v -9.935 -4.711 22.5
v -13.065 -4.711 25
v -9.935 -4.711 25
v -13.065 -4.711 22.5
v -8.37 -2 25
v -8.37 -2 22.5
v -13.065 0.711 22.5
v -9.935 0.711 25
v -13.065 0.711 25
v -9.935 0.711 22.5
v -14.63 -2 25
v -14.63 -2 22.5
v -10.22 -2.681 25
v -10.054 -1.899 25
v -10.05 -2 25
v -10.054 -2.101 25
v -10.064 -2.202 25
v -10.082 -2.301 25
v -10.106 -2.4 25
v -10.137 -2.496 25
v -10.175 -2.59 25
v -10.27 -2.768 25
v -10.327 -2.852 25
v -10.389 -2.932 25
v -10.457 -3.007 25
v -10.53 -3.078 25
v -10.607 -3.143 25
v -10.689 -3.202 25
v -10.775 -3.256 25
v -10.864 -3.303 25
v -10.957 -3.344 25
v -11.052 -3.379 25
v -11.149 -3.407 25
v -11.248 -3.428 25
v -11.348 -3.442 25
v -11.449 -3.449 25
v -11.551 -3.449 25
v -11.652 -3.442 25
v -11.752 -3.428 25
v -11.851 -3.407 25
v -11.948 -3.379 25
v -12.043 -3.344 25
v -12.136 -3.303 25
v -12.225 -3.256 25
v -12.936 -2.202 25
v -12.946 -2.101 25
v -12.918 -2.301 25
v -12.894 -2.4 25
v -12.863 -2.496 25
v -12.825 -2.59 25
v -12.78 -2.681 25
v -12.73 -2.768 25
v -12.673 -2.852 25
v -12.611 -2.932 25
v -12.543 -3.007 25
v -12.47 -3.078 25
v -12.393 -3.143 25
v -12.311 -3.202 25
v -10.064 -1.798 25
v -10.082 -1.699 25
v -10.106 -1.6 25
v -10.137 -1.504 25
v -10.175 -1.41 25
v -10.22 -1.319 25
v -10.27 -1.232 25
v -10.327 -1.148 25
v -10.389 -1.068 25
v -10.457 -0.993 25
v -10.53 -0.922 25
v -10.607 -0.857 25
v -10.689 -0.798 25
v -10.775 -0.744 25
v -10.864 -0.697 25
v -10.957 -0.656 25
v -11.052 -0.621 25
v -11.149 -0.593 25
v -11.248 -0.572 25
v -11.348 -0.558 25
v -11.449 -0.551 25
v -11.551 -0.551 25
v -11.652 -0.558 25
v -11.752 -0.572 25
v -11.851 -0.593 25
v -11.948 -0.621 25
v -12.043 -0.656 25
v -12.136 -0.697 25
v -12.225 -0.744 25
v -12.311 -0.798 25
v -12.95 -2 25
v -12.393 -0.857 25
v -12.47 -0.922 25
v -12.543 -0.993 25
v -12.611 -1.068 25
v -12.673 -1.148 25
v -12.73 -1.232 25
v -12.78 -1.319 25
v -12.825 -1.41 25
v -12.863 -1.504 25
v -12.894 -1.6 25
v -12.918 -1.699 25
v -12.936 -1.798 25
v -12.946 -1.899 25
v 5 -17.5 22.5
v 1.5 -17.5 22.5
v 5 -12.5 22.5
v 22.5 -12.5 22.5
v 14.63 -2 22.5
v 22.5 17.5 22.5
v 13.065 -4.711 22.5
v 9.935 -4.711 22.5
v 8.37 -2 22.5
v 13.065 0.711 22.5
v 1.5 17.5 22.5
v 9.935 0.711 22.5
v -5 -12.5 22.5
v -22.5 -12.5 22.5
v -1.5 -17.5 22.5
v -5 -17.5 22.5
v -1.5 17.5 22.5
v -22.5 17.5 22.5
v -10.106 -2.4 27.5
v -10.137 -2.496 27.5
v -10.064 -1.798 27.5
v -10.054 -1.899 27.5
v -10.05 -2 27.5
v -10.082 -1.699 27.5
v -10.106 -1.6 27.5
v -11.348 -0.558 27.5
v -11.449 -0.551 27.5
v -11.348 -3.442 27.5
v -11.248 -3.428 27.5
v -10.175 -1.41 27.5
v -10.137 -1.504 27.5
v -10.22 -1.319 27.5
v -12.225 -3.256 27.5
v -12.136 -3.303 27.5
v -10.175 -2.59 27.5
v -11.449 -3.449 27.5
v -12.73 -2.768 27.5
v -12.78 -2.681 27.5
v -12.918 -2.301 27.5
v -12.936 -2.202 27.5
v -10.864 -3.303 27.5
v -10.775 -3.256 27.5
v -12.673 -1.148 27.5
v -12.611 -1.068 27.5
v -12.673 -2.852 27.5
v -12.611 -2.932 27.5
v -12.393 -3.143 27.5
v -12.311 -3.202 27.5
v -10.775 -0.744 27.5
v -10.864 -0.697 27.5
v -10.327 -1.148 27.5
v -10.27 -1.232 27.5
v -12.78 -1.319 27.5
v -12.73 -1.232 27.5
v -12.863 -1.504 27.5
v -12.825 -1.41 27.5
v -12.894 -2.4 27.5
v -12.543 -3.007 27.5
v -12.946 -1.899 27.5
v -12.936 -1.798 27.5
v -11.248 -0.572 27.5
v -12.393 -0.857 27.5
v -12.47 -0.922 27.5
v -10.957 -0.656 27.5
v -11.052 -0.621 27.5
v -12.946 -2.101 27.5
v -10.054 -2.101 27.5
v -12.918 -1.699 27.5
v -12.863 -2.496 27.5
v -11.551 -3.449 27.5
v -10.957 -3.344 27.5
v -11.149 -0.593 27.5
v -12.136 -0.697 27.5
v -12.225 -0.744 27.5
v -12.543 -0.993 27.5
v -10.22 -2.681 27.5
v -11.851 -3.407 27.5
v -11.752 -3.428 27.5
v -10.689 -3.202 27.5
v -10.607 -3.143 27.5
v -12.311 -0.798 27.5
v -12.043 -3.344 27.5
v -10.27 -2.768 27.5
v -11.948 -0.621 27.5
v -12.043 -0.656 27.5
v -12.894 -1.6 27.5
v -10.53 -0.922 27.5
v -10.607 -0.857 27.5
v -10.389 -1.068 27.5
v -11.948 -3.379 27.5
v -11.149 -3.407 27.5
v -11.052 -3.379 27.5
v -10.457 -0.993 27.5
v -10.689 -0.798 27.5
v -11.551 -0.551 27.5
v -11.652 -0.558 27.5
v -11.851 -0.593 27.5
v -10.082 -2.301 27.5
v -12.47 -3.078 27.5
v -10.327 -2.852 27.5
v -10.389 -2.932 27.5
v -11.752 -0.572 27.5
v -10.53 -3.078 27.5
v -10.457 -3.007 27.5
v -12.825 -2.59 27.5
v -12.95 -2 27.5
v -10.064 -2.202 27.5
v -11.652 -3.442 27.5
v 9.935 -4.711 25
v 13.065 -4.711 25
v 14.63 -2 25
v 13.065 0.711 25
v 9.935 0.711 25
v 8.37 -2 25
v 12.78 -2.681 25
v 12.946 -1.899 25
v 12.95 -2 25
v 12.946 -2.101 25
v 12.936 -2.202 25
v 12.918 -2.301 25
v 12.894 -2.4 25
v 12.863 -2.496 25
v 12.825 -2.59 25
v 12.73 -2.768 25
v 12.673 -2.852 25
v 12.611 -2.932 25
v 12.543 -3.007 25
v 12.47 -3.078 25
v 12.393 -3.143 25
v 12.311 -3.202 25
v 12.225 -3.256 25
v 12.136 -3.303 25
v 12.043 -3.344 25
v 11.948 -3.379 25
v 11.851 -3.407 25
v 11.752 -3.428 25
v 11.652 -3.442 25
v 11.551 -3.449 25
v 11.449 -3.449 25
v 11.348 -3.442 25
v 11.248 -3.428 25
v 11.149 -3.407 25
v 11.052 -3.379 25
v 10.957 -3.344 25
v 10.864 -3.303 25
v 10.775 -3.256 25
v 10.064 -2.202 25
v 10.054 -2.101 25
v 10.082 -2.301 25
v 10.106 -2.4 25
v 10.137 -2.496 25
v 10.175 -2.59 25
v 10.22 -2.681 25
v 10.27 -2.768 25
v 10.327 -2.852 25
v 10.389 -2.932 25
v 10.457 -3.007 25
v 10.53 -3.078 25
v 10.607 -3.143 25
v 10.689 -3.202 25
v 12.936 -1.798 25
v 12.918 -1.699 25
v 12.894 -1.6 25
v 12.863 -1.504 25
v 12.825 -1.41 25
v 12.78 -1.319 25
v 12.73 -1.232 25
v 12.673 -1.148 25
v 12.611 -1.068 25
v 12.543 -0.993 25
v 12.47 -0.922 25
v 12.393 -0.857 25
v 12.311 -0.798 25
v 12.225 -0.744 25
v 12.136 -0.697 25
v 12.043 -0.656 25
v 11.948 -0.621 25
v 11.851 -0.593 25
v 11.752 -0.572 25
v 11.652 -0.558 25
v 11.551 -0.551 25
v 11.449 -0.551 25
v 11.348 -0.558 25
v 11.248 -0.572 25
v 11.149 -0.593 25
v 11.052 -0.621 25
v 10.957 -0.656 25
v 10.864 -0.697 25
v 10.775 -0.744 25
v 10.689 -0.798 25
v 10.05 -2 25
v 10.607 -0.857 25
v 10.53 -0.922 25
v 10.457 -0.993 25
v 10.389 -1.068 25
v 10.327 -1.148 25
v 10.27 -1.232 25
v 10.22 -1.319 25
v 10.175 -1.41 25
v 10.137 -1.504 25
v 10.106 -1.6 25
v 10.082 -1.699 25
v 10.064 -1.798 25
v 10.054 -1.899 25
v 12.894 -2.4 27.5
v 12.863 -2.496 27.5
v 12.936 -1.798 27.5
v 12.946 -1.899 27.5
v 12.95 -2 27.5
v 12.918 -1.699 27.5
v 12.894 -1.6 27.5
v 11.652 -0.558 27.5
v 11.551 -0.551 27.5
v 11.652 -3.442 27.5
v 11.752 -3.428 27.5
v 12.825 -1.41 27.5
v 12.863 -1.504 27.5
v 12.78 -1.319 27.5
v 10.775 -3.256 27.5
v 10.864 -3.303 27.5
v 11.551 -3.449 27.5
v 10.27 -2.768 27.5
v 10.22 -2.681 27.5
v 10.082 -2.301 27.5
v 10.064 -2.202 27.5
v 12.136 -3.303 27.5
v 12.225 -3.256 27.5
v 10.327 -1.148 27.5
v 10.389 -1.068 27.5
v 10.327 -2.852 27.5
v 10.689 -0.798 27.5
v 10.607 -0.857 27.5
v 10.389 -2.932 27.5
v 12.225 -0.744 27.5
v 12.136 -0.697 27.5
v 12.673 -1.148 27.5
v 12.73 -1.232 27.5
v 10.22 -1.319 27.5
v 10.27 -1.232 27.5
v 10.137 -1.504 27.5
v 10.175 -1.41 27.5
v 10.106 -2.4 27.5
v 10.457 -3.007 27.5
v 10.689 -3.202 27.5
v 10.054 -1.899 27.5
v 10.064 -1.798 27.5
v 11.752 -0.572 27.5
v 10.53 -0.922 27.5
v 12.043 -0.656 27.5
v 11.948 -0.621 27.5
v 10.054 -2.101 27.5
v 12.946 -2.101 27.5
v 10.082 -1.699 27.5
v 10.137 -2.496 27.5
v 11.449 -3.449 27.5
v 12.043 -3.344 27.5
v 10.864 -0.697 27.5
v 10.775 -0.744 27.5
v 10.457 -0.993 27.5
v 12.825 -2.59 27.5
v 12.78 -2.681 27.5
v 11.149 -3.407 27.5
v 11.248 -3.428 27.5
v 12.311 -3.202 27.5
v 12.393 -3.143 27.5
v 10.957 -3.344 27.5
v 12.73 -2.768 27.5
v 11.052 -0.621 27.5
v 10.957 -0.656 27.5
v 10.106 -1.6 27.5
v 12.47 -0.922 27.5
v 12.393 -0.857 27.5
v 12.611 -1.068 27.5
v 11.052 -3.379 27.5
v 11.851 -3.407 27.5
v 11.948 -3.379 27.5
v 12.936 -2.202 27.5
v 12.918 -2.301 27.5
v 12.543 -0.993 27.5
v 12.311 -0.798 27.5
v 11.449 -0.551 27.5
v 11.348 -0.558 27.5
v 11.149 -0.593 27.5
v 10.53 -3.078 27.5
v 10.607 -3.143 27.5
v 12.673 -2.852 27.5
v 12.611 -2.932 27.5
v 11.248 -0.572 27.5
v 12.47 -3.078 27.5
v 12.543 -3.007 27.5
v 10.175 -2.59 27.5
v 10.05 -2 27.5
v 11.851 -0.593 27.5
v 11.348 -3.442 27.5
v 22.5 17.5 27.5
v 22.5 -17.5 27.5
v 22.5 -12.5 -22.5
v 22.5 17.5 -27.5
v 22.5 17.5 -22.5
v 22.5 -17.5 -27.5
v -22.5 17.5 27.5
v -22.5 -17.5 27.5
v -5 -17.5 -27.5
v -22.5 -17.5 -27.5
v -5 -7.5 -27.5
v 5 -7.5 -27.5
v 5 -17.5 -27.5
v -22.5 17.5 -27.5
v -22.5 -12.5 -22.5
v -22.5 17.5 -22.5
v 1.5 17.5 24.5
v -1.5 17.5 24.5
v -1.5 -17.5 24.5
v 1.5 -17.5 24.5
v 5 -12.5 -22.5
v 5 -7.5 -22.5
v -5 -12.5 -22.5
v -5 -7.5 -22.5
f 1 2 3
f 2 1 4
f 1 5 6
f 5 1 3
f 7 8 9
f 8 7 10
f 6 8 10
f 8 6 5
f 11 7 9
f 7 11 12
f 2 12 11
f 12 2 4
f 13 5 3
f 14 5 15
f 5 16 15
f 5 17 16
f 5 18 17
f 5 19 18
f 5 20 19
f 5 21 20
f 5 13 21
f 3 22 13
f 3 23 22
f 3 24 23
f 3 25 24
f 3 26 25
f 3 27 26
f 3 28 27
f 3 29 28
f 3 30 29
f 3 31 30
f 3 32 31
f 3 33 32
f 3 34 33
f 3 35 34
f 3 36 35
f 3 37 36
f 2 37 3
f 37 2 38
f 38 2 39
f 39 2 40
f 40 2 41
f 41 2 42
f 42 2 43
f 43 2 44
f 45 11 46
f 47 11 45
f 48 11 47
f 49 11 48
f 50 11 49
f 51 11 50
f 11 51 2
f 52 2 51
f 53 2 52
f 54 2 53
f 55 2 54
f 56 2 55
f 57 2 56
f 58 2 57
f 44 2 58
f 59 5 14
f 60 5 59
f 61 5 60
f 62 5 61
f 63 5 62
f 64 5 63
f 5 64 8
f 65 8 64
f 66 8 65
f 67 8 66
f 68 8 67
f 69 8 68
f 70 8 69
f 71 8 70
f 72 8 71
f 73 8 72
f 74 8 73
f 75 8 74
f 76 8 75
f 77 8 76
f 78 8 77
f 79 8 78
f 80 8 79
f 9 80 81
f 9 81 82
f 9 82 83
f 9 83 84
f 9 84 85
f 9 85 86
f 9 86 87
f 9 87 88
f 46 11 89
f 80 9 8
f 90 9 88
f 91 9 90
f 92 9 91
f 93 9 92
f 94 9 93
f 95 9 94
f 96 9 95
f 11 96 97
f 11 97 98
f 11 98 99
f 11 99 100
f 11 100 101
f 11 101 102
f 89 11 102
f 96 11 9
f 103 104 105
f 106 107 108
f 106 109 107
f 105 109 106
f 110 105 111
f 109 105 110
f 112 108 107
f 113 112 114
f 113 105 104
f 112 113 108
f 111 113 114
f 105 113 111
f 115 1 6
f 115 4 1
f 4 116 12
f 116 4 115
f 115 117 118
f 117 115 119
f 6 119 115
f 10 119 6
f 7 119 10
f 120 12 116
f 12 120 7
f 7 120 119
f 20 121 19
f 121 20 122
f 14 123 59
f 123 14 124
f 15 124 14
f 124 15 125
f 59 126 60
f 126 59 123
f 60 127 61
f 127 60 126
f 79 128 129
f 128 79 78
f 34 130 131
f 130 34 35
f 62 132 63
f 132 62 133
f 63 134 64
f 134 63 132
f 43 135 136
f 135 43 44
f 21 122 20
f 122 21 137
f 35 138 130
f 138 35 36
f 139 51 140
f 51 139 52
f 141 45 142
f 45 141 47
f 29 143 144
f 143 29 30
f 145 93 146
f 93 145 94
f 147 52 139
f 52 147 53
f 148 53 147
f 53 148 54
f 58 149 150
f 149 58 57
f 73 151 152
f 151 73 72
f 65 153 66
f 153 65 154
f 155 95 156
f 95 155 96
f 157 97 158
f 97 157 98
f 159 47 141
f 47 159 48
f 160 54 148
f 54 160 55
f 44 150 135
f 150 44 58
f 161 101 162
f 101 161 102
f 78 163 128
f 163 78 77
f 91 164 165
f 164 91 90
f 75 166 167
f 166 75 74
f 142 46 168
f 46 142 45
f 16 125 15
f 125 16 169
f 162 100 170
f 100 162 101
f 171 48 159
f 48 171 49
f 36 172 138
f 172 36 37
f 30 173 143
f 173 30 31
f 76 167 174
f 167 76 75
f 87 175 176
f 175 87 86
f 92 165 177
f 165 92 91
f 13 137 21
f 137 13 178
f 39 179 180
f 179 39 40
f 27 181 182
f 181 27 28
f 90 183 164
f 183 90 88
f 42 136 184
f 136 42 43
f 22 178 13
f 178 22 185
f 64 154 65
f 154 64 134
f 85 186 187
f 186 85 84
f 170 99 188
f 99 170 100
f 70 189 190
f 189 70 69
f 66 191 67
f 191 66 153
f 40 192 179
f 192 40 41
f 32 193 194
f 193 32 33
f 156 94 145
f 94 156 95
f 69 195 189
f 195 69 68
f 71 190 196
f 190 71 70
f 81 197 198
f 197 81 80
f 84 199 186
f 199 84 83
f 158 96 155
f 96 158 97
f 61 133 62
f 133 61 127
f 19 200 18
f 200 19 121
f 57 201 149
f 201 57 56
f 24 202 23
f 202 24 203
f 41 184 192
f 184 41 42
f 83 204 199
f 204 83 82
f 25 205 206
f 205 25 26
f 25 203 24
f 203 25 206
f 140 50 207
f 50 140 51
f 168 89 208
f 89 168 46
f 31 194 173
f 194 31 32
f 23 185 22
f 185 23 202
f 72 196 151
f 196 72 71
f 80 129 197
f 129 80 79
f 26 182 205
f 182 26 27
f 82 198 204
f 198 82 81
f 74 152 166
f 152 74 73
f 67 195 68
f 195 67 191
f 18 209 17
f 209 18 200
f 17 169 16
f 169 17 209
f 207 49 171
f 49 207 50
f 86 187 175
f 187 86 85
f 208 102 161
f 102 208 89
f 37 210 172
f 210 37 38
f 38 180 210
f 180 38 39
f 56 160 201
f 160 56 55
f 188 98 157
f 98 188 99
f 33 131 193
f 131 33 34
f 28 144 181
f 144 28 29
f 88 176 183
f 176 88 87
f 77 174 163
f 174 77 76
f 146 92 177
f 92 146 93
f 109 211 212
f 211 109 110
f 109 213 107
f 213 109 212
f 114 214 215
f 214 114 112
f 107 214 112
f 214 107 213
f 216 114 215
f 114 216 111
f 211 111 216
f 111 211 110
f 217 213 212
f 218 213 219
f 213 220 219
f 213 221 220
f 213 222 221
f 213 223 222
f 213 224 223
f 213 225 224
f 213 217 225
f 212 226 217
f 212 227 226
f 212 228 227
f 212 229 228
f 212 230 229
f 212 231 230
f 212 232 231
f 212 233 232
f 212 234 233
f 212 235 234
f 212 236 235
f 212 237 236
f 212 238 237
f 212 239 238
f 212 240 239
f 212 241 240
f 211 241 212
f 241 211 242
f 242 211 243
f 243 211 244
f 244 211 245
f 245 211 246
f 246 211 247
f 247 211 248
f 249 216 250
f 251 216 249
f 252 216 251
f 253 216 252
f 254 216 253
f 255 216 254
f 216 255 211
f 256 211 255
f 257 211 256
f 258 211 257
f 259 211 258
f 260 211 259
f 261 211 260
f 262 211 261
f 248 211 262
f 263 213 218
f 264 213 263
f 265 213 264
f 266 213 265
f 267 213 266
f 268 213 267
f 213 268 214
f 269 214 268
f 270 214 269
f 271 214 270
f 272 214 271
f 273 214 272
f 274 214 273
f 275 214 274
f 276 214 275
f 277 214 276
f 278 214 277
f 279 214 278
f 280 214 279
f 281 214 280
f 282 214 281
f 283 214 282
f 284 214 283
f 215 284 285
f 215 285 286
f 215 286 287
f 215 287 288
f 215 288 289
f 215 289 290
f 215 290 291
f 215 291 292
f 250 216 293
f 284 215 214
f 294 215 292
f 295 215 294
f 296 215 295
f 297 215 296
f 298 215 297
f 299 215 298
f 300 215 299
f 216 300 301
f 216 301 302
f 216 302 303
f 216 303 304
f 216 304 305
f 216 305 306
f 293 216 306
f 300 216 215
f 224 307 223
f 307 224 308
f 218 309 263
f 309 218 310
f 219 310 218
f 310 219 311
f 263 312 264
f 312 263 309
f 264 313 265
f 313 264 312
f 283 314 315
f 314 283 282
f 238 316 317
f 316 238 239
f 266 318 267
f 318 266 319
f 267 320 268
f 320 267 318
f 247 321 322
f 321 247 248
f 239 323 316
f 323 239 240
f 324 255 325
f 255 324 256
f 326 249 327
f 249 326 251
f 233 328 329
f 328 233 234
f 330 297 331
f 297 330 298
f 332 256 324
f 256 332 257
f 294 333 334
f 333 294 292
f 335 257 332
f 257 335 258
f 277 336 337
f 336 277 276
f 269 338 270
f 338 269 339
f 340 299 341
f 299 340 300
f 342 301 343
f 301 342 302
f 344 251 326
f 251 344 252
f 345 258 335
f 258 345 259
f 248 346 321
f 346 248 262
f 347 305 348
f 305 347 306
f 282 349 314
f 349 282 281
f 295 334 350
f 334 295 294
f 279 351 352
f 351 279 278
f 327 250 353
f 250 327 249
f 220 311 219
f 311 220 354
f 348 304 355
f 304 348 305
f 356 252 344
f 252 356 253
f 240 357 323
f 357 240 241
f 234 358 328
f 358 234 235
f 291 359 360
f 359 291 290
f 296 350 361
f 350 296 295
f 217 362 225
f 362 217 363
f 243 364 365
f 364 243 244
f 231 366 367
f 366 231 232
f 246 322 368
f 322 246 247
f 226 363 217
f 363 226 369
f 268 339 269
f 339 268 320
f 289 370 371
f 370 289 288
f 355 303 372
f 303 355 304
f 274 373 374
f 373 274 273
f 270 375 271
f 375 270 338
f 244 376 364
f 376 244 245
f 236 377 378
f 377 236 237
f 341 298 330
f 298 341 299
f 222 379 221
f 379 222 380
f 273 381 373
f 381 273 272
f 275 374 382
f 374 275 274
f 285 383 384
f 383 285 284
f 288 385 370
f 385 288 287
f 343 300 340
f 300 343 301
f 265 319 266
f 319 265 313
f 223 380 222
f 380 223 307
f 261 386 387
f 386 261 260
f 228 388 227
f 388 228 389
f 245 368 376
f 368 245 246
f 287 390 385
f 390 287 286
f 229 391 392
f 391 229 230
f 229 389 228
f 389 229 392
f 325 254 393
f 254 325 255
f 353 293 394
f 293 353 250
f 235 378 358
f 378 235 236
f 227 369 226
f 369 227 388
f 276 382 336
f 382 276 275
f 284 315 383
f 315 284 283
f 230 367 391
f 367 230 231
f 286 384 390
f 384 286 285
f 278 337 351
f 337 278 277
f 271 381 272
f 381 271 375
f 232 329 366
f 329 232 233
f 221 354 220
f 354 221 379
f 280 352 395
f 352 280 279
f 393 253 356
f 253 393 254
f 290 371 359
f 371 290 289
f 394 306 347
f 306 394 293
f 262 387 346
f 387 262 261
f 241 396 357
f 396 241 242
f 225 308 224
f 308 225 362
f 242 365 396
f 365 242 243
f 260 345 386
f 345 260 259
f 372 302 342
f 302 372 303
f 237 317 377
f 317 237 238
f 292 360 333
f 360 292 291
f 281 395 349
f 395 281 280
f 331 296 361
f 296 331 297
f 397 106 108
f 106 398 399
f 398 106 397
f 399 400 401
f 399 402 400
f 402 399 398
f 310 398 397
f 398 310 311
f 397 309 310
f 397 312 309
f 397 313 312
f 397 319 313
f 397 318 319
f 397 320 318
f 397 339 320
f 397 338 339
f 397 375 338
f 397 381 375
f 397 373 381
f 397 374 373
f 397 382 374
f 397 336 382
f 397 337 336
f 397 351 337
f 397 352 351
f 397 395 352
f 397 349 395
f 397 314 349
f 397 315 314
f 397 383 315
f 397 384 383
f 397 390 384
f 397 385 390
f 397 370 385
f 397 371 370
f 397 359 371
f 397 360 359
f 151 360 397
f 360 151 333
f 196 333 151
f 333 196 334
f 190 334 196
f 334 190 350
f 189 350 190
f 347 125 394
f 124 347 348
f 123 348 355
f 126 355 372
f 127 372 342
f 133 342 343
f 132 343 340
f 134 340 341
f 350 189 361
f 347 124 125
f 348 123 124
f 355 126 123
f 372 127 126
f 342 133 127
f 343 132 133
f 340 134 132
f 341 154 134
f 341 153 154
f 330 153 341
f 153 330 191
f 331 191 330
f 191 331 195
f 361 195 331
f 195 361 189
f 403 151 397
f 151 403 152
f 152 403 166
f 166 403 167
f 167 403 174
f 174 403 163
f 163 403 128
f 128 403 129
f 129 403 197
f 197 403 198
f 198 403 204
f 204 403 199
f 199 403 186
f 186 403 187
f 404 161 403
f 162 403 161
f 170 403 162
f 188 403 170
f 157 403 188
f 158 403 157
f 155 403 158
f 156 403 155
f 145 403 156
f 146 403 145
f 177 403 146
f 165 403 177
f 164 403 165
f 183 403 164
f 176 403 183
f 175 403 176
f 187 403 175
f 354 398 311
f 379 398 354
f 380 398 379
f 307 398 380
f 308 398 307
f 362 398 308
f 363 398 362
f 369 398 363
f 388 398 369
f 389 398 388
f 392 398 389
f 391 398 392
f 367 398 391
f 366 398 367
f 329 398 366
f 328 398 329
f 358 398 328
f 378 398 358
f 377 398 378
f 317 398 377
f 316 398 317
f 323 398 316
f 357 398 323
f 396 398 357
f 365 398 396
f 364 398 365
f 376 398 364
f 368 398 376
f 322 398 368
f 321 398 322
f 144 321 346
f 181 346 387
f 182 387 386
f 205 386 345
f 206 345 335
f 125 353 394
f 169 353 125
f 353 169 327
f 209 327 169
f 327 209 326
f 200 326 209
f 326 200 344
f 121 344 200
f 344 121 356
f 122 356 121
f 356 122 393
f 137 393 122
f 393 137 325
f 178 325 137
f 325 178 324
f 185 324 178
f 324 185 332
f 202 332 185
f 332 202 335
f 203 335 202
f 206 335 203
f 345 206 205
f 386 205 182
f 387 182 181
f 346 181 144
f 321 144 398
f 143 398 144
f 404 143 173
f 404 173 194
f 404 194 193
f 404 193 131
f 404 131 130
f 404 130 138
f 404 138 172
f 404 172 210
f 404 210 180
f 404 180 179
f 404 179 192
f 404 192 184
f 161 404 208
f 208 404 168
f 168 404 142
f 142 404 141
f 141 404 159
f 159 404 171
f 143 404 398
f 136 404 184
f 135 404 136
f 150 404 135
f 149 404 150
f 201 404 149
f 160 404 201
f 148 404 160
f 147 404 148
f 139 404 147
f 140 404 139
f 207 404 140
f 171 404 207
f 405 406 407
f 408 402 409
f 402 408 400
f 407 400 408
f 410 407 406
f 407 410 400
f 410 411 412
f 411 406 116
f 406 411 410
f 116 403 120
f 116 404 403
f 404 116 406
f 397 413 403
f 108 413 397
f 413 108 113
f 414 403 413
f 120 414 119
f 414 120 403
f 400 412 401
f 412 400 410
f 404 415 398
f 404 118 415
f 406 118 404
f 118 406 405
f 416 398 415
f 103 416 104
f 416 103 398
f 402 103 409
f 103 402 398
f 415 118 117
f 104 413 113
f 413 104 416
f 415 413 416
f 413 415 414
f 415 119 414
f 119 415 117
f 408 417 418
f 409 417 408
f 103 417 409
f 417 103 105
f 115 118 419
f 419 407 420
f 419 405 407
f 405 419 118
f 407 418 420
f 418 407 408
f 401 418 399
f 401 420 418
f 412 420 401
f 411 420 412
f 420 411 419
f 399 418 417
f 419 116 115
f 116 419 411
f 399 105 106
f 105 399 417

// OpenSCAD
outterHeight = 55;
depth = 35;
width = 45;

difference(){
	cube([width, depth, outterHeight], center=true);
	translate([0, 0, outterHeight/2-4])
		#cube([3, depth, 2], center=true);
	translate([0, -12.5, -5])
		#cube([10, 10, outterHeight], center=true);
	translate([0, 2.5, -0])
		cube([width, depth-5, 45], center=true);
	
	xAbs = 11.5;
	for(x=[-xAbs, xAbs]){
		translate([x, -2, 22.5]){
			#cylinder(d=6.26, h=2.5, $fn=6);
			#cylinder(d=2.9, h=10, $fn=90);
		}	
	}
}
